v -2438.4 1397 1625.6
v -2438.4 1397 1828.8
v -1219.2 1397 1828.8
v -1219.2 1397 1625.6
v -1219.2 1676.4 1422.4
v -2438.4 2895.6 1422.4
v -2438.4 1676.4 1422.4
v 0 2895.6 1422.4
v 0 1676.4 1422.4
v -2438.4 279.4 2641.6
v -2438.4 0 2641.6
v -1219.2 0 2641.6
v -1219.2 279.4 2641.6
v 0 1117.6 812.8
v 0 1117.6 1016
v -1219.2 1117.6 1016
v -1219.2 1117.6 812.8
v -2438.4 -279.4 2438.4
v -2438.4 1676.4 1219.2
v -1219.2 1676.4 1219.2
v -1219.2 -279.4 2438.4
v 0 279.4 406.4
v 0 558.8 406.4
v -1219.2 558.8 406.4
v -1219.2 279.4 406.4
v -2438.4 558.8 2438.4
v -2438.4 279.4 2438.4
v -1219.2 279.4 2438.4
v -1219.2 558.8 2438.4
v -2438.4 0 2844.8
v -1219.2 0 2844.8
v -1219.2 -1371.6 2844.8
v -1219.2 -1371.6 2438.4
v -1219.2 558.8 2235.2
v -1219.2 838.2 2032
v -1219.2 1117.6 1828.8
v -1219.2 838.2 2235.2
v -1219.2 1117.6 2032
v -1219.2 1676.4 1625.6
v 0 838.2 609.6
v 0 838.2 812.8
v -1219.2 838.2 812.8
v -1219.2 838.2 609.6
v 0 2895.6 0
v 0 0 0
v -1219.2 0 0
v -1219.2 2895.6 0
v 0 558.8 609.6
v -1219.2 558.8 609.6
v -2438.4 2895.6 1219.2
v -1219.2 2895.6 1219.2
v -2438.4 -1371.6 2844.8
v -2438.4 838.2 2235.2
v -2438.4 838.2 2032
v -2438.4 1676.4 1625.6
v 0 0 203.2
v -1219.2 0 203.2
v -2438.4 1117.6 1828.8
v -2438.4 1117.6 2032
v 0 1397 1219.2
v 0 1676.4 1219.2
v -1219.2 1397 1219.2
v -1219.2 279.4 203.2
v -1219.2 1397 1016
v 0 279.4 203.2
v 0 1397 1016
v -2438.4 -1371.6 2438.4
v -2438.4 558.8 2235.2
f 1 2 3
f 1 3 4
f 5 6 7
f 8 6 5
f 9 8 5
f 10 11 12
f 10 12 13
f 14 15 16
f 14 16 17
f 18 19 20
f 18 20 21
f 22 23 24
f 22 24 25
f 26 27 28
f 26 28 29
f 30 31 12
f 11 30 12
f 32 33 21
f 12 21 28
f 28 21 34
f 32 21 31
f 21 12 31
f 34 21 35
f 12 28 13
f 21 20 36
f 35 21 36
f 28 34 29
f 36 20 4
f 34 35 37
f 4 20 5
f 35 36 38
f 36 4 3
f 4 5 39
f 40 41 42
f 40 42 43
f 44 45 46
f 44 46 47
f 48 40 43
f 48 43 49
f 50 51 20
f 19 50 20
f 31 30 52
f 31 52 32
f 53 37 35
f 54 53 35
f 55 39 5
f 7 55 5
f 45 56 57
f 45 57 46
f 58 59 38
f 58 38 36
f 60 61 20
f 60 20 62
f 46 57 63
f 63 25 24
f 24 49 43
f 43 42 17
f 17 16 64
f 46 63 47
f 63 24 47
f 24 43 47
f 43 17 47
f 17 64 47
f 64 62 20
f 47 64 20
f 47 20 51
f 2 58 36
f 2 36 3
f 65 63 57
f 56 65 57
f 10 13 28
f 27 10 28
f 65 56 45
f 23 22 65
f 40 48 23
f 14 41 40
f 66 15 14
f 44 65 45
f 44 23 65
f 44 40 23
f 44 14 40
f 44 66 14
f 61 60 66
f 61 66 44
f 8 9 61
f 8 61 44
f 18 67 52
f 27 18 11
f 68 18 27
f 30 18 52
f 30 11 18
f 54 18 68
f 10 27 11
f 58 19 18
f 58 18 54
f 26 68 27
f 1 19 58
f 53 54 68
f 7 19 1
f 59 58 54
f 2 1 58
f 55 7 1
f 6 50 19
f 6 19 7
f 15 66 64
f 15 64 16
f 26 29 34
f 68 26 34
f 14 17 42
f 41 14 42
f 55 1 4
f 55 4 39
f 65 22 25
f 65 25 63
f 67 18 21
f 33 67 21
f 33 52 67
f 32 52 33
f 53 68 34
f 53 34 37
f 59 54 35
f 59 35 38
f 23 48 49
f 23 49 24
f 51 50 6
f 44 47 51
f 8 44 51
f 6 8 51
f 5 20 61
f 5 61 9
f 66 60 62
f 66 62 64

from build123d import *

# Parameters (mm, degrees)
F1_DEPTH = 1219.2
F2_W     = 1219.2
F2_H     = 203.2
F3_DEPTH = 1219.2
F5_DEPTH = 1219.2
F6_W     = 1219.2
F6_H     = 406.4
F7_DEPTH = 1092.2


with BuildPart() as f1:
    # F0 (on Right) → F1 (new body)
    with BuildSketch(Plane.YZ):
        Polygon((0, 203.2), (0, 0), (2895.6, 0), (2895.6, 1422.4), (1676.4, 1422.4), (1676.4, 1219.2), (1397, 1219.2), (1397, 1016), (1117.6, 1016), (1117.6, 812.8), (838.2, 812.8), (838.2, 609.6), (558.8, 609.6), (558.8, 406.4), (279.4, 406.4), (279.4, 203.2), align=None)
    extrude(amount=-F1_DEPTH)

    # F2 (on face) → F3 (join)
    with BuildSketch(Plane(origin=(-1219.2, 0, 0), x_dir=(0, -1, 0), z_dir=(-1, 0, 0))):
        with Locations((-2286, 1320.8)):
            Rectangle(F2_W, F2_H)
    extrude(amount=F3_DEPTH)

    # F4 (on face) → F5 (join, through all)
    with BuildSketch(Plane(origin=(-2438.4, 0, 0), x_dir=(0, -1, 0), z_dir=(-1, 0, 0))):
        Polygon((-1676.4, 1625.6), (-1676.4, 1219.2), (279.4, 2438.4), (279.4, 2844.8), (0, 2844.8), (0, 2641.6), (-279.4, 2641.6), (-279.4, 2438.4), (-558.8, 2438.4), (-558.8, 2235.2), (-838.2, 2235.2), (-838.2, 2032), (-1117.6, 2032), (-1117.6, 1828.8), (-1397, 1828.8), (-1397, 1625.6), align=None)
    extrude(amount=-F5_DEPTH)

    # F6 (on face) → F7 (join)
    with BuildSketch(Plane.XZ.offset(279.4)):
        with Locations((-1828.8, 2641.6)):
            Rectangle(F6_W, F6_H)
    extrude(amount=F7_DEPTH)


solid = f1.part
